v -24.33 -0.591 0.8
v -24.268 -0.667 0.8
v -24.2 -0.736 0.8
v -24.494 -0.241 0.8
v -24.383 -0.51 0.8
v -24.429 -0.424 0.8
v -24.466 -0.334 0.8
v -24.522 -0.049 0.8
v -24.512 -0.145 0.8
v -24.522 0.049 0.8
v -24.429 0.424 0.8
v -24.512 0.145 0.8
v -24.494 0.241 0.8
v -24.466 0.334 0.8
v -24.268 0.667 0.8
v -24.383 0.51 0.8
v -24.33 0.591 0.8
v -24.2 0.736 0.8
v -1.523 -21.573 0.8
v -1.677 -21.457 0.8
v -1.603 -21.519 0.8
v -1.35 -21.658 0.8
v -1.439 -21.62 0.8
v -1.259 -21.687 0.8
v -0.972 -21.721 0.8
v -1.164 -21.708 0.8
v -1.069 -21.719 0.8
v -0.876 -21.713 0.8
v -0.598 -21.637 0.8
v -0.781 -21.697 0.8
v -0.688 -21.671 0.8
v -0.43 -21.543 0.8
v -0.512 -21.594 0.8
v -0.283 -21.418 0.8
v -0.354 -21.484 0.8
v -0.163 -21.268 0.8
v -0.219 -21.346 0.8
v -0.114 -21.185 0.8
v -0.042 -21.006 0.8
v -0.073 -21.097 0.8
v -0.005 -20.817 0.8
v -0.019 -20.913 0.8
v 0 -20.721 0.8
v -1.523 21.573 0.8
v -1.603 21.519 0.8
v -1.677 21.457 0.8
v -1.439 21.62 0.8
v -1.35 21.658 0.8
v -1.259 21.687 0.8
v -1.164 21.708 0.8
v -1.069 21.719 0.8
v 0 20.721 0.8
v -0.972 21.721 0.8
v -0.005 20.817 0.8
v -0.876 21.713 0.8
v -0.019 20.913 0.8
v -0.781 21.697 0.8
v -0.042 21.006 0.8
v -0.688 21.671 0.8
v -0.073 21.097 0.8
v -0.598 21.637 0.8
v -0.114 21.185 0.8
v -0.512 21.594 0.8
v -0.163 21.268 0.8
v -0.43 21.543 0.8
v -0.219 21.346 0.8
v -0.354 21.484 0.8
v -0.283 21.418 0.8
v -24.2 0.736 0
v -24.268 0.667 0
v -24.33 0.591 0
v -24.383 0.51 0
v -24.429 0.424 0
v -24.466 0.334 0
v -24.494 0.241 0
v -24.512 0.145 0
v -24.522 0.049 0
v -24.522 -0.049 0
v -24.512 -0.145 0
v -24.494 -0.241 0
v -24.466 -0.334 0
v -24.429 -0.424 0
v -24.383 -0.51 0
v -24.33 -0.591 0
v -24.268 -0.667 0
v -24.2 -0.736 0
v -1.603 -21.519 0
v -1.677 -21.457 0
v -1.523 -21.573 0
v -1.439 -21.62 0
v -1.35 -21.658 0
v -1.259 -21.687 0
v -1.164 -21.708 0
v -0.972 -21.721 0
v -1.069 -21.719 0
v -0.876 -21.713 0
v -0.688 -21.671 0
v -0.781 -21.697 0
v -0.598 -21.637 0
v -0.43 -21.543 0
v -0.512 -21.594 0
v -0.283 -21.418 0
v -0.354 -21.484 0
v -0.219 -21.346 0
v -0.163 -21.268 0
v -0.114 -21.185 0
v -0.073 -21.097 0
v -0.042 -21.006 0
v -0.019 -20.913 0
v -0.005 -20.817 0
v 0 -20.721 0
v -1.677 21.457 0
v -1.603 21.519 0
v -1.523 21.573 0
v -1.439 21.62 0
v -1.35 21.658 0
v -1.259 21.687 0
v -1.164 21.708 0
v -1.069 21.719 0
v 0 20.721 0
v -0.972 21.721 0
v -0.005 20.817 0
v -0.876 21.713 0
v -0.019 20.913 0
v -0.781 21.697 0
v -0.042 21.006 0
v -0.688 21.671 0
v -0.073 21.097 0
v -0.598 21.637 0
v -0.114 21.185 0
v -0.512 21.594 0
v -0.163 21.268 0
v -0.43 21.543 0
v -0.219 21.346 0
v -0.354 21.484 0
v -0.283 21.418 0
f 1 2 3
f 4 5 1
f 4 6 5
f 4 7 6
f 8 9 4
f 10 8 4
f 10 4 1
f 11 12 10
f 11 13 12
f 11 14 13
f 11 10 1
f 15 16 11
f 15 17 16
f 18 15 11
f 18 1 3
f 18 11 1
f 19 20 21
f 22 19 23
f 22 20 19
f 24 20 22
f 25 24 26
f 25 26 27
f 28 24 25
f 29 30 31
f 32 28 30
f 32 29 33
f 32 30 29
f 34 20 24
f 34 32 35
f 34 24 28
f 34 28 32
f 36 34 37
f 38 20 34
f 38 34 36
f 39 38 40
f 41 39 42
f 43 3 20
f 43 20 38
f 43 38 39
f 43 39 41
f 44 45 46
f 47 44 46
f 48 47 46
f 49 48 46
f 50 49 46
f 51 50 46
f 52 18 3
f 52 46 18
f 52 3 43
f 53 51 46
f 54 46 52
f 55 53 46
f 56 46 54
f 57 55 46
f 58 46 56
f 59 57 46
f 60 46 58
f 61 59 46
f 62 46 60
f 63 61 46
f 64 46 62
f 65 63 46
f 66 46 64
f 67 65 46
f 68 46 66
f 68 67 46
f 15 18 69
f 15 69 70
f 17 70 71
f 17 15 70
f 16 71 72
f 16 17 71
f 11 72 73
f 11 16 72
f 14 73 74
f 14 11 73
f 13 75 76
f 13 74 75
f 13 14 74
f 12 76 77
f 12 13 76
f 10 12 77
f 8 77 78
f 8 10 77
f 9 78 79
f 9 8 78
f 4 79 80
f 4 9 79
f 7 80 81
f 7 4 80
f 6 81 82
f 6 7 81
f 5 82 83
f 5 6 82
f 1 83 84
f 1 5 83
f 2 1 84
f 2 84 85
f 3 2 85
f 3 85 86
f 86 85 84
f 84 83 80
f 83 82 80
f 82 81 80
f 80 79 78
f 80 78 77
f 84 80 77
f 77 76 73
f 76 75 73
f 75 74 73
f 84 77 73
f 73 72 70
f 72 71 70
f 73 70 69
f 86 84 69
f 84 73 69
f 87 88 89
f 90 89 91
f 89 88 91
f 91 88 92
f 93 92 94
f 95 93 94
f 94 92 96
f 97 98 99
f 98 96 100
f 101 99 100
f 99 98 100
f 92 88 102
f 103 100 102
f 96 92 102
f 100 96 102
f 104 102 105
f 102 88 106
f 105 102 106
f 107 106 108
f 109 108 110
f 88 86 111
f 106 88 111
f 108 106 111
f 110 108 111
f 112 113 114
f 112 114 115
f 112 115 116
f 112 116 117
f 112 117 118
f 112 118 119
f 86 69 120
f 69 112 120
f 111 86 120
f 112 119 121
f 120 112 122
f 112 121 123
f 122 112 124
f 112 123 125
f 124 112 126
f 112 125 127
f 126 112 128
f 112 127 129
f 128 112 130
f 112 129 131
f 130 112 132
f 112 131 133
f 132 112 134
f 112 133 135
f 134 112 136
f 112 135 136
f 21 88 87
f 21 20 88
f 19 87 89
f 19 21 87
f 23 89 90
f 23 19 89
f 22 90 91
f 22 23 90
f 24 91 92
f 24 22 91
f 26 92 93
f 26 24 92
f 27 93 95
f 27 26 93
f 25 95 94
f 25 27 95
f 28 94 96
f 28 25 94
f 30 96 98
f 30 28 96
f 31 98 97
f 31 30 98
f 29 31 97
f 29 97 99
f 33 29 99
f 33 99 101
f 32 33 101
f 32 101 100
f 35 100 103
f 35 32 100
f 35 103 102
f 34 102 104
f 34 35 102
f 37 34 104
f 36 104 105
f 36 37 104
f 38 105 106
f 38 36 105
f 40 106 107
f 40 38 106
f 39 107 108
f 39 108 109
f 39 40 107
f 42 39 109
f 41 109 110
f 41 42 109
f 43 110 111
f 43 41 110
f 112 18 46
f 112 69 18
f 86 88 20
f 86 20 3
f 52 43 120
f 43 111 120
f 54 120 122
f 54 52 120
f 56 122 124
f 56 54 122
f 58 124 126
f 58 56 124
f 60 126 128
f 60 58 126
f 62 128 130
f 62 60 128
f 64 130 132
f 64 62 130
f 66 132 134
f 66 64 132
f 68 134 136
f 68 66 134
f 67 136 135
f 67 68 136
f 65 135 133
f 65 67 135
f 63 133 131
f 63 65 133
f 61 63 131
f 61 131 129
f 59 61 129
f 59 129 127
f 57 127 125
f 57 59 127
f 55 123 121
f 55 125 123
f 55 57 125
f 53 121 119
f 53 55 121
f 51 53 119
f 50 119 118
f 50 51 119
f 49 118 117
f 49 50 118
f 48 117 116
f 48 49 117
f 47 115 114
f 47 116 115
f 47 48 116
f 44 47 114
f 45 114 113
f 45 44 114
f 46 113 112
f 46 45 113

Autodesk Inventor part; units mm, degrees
ref_plane "YZ Plane" through (0, 0, 0) normal (1, 0, 0) x (0, 1, 0)
ref_plane "XZ Plane" through (0, 0, 0) normal (0, 1, 0) x (-1, 0, 0)
ref_plane "XY Plane" through (0, 0, 0) normal (0, 0, 1) x (1, 0, 0)
sketch "Sketch1" plane through (0, 0, 0) normal (0, 0, 1) x (1, 0, 0)
  line L0 (0, -23) -> (0, 23)
  line L1 (0, -23) -> (-25, 0)
  line L2 (-25, 0) -> (0, 23)
  point P0 (0, 0)
  point P1 (0, 0)
  point P2 (0, 0)
  dimension "d1" = 46
  dimension "d9" = 25
extrude "Plate1" add sketch "Sketch1" along normal blind 0.8
fillet "Corner Round2" radius 1 3 edges at (0, -23, 0.4) (-25, 0, 0.4) (0, 23, 0.4)
equation "\"d2\" = Thickness"
equation "\"BendReliefWidth\" = Thickness"
equation "\"BendReliefDepth\" = 0.5 * Thickness"
equation "\"CornerReliefSize\" = 4 * Thickness"
equation "\"MinimumRemnant\" = 2 * Thickness"
equation "\"TransitionRadius\" = BendRadius"
equation "\"JacobiRadiusSize\" = BendRadius"
equation "\"GapSize\" = Thickness"
equation "\"Thickness\" = 0.8"
equation "\"BendRadius\" = 2.75"
properties part number "DS-B-503 CAP" material "Stainless Steel"
